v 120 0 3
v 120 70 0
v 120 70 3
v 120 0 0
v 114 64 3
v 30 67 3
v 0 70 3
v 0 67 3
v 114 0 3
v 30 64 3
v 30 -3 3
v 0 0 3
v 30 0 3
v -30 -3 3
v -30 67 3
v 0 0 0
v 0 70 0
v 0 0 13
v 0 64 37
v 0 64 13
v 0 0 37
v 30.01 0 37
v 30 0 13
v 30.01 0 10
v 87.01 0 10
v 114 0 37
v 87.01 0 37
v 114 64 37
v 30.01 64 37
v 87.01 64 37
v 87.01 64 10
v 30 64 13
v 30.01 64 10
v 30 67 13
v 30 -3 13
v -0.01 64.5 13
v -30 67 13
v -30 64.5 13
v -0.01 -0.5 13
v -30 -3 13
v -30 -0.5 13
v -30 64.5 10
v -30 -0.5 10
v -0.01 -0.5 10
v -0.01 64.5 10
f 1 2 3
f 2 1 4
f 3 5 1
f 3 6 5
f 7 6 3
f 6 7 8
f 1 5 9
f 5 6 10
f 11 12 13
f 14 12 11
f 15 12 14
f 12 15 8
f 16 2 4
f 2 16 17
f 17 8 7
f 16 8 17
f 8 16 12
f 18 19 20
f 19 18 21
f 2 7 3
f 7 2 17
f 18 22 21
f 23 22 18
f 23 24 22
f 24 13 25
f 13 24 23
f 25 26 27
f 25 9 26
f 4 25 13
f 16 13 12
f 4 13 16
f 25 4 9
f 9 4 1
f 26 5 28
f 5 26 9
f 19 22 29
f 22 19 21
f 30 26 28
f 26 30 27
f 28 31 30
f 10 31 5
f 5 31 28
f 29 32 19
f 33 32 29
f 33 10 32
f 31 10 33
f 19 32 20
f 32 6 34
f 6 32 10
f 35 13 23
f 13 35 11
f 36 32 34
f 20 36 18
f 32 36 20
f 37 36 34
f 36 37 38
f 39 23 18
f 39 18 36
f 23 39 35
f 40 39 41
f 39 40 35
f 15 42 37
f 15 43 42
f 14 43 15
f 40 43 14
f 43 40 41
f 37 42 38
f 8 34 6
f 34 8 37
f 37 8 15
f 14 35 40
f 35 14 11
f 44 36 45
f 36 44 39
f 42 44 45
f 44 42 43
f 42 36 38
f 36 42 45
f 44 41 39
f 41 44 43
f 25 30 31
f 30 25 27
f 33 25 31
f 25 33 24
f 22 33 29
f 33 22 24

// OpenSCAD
// Buffer tank for mini horizontal gel electrophoresis
// Units: mm. Tank rests on XY plane (z = 0), builds upward.

$fn = 96;

// ---- Tank ----
tank_x      = 120;   // outer length (X)
tank_y      = 70;    // outer width (Y)
tank_h      = 40;    // outer height (Z)
wall        = 3;     // wall thickness
floor_t     = 3;     // floor thickness

// ---- Platform ----
plat_x      = 60;    // platform length in X (centred)
plat_top_z  = 10;    // platform top height above inner floor (z = 13)

// ---- Electrode holes ----
hole_d      = 2;     // electrode hole diameter
hole_y      = 0;     // electrode hole Y position
hole_z      = 30;    // electrode hole Z position

// ---- Misc ----
eps         = 0.5;   // cutter overshoot past faces

// Inner dimensions
inner_x = tank_x - 2 * wall;
inner_y = tank_y - 2 * wall;
inner_h = tank_h - floor_t;

// Platform legs extend into the buffer chambers
leg_x = (inner_x - plat_x) / 2 + wall;

difference() {
    union() {
        // Tank body
        cube([tank_x, tank_y, floor_t]);
        cube([inner_x, inner_y, inner_h]);
        // Raised platform
        translate([-plat_x / 2, -wall, floor_t])
            cube([plat_x, tank_y, plat_top_z]);
    }

    // Door-like bridge across each end, above the platform,
    // leaving the two buffer chambers connected
    translate([-inner_x / 2 - 0.01, -eps, plat_top_z])
        cube([inner_x / 2, inner_y + 2 * eps, tank_h - floor_t]);
    translate([plat_x / 2 + 0.01, -eps, plat_top_z])
        cube([inner_x / 2, inner_y + 2 * eps, tank_h - floor_t]);

    // Horizontal electrode holes through each end wall
    translate([-tank_x / 2, hole_y, hole_z])
        rotate([-90, 0, 0]) cylinder(d = hole_d, h = tank_y + 2 * eps);
    translate([tank_x / 2, hole_y, hole_z])
        rotate([-90, 0, 0]) cylinder(d = hole_d, h = tank_y + 2 * eps);
}
